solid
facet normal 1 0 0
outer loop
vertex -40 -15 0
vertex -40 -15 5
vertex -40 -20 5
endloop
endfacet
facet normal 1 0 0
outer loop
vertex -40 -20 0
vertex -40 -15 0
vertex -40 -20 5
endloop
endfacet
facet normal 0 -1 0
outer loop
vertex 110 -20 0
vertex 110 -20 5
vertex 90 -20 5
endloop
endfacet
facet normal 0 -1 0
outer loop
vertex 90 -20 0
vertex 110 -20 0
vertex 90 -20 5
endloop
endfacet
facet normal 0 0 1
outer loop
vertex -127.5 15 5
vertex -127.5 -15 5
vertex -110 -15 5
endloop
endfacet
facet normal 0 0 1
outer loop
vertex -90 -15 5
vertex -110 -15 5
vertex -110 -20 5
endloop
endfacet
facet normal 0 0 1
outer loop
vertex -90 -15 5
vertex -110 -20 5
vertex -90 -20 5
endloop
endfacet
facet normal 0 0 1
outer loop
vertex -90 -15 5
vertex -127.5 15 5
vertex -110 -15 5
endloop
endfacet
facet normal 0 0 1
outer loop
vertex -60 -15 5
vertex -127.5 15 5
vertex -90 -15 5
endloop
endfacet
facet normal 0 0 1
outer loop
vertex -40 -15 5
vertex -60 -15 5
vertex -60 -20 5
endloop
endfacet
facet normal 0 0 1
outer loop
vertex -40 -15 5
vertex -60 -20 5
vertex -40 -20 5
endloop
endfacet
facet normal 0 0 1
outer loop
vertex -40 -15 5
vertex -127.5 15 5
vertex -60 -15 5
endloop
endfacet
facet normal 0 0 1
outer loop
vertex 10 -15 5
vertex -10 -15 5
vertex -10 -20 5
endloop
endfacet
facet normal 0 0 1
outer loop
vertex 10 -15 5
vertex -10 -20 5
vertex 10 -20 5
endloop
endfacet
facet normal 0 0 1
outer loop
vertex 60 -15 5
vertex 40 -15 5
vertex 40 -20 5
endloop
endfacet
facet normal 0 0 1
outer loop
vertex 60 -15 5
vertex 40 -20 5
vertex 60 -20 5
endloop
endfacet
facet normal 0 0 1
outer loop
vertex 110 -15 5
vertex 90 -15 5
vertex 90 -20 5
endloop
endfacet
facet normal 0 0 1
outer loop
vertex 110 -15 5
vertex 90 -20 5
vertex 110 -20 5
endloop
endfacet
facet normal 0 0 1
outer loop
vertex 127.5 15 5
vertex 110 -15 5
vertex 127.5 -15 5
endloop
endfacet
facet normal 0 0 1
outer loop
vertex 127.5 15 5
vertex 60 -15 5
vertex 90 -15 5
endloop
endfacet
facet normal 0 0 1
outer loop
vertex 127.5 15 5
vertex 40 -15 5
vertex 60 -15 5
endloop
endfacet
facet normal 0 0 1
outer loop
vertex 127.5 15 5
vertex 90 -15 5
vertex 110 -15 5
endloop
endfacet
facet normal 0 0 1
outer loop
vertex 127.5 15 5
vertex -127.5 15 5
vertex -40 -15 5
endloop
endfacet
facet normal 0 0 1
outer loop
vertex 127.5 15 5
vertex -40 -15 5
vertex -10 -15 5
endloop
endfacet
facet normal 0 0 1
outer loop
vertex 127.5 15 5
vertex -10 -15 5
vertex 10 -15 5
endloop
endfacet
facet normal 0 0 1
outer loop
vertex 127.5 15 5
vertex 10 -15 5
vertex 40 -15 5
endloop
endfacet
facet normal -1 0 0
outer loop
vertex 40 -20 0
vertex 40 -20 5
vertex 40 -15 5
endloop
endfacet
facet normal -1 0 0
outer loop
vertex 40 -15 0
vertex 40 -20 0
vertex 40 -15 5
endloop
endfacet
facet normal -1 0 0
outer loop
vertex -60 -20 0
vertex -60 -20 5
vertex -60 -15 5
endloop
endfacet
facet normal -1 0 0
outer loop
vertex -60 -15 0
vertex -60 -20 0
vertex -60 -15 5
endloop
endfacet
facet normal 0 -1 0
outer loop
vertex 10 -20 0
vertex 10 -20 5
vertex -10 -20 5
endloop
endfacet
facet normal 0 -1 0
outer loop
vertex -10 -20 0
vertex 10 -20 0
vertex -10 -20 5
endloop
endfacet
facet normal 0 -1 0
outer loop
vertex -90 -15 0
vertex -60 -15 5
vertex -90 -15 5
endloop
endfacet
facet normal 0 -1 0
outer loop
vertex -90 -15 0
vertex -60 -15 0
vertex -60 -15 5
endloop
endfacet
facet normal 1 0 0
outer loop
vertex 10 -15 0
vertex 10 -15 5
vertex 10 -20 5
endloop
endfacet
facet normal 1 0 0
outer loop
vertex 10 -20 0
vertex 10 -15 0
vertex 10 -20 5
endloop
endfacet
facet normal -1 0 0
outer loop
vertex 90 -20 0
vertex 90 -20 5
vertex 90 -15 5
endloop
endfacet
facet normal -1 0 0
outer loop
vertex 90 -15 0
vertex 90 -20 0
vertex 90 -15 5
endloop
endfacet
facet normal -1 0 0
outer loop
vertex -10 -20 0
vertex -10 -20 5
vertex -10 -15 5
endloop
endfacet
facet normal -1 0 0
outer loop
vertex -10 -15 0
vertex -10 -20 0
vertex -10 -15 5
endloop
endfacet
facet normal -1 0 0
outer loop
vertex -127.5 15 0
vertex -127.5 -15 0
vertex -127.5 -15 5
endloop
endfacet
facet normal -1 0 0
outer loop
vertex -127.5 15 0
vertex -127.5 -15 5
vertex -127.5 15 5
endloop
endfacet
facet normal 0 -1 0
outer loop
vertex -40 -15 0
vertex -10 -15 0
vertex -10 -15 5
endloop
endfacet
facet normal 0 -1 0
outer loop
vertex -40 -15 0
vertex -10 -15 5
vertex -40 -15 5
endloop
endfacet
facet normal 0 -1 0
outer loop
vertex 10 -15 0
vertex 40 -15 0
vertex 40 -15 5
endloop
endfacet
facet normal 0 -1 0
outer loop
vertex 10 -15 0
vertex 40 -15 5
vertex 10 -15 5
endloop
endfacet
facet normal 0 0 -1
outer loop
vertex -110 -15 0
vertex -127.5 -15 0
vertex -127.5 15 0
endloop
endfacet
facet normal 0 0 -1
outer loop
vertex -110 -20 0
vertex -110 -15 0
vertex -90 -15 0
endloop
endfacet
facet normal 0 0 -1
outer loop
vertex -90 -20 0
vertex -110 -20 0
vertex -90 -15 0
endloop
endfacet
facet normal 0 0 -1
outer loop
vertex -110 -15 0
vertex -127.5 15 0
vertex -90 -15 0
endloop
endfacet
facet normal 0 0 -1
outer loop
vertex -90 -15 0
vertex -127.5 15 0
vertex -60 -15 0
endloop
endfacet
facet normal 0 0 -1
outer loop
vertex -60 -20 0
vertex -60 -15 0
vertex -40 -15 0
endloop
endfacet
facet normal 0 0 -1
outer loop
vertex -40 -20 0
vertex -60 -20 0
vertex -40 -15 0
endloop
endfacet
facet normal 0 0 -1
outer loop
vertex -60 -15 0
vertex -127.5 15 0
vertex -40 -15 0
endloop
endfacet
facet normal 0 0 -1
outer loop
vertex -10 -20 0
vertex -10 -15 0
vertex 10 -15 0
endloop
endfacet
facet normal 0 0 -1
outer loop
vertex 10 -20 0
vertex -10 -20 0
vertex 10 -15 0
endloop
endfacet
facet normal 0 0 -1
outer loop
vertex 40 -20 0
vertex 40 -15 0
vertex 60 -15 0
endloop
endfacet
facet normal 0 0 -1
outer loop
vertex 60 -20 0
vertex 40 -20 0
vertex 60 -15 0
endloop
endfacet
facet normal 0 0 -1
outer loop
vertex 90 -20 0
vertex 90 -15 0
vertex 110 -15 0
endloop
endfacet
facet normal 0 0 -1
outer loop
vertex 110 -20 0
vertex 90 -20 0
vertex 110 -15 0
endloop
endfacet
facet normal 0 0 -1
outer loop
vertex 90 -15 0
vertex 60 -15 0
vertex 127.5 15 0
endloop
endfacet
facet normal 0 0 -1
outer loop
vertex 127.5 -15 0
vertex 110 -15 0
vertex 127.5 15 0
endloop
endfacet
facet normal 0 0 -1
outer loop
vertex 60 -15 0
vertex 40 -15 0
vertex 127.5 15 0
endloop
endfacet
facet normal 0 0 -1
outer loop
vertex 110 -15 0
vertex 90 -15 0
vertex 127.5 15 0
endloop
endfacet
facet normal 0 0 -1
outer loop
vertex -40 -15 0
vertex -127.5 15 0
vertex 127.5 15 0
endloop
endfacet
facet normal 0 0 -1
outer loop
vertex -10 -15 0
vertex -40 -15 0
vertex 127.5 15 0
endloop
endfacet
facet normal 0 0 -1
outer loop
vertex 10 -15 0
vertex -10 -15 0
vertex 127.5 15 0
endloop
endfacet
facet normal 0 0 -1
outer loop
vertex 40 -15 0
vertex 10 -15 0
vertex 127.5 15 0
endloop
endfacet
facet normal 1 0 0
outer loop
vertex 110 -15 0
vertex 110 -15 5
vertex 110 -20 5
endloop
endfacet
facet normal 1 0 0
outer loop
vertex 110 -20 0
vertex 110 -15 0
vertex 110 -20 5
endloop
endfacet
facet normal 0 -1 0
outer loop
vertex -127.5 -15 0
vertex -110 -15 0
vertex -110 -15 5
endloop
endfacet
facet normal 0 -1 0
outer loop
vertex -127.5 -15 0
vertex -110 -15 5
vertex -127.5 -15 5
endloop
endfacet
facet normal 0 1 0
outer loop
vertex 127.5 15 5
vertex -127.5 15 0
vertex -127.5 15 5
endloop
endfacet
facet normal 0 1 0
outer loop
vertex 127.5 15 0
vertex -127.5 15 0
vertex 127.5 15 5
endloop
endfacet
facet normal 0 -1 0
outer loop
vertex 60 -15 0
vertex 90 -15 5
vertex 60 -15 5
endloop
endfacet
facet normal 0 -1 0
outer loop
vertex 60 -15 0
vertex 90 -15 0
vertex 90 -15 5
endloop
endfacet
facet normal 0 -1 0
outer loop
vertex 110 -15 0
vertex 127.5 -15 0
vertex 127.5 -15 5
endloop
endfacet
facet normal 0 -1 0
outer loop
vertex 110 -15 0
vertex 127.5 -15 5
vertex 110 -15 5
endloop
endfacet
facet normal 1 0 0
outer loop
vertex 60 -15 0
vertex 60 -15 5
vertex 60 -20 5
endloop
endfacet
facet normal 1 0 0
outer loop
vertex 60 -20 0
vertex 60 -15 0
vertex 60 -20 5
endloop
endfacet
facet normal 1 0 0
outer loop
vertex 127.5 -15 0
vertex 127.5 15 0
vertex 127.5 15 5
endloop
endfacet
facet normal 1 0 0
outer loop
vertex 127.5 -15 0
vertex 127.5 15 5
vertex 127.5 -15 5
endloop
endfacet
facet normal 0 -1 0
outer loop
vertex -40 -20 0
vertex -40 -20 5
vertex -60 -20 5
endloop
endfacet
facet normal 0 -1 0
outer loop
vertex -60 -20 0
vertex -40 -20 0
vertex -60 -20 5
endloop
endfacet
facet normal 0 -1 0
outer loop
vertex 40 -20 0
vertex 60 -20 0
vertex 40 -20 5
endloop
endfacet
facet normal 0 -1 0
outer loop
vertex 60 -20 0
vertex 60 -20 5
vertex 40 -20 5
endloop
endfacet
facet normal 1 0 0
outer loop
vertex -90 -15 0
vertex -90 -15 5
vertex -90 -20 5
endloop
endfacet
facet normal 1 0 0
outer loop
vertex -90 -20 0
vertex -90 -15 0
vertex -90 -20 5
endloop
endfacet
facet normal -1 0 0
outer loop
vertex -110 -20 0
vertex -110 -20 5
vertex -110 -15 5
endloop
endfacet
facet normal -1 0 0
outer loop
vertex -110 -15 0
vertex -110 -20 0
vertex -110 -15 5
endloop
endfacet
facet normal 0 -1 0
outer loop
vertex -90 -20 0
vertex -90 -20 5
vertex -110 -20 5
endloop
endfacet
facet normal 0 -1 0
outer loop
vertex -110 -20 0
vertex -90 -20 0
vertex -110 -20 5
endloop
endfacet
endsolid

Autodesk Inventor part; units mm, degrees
ref_plane "YZ Plane" through (0, 0, 0) normal (1, 0, 0) x (0, 1, 0)
ref_plane "XZ Plane" through (0, 0, 0) normal (0, 1, 0) x (-1, 0, 0)
ref_plane "XY Plane" through (0, 0, 0) normal (0, 0, 1) x (1, 0, 0)
sketch "Sketch1" plane through (0, 0, 0) normal (0, 0, 1) x (1, 0, 0)
  line L0 (-127.5, 15) -> (127.5, 15)
  line L1 (127.5, 15) -> (127.5, -15)
  line L2 (127.5, -15) -> (-127.5, -15)
  line L3 (-127.5, -15) -> (-127.5, 15)
  line L4 (-127.5, 15) -> (127.5, -15) construction
  line L5 (127.5, 15) -> (-127.5, -15) construction
  point P0 (0, 0)
  dimension "d0" = 255
  dimension "d1" = 30
extrude "Extrusion1" add sketch "Sketch1" along normal blind 5
sketch "Sketch2" plane through (0, 0, 5) normal (0, 0, 1) x (1, 0, 0)
  line L0 (-127.5, -15) -> (127.5, -15) projected
  line L1 (-110, -15) -> (-90, -15)
  line L2 (-90, -15) -> (-90, -20)
  line L3 (-90, -20) -> (-110, -20)
  line L4 (-110, -20) -> (-110, -15)
  line L5 (-60, -15) -> (-40, -15)
  line L6 (-40, -15) -> (-40, -20)
  line L7 (-40, -20) -> (-60, -20)
  line L8 (-60, -20) -> (-60, -15)
  line L9 (-10, -15) -> (10, -15)
  line L10 (10, -15) -> (10, -20)
  line L11 (10, -20) -> (-10, -20)
  line L12 (-10, -20) -> (-10, -15)
  line L13 (40, -15) -> (60, -15)
  line L14 (60, -15) -> (60, -20)
  line L15 (60, -20) -> (40, -20)
  line L16 (40, -20) -> (40, -15)
  line L17 (90, -15) -> (110, -15)
  line L18 (110, -15) -> (110, -20)
  line L19 (110, -20) -> (90, -20)
  line L20 (90, -20) -> (90, -15)
  point P0 (0, 0)
  point P1 (60, -15)
  point P2 (40, -15)
  point P3 (-90, -15)
  point P4 (-40, -15)
  point P5 (-60, -15)
  point P6 (10, -15)
  point P7 (-10, -15)
  point P8 (110, -15)
  point P9 (90, -15)
  dimension "d4" = 20
  dimension "d5" = 5
  dimension "d6" = 17.5
  dimension "d9" = 50
  dimension "d14" = 17.5
extrude "Extrusion2" add sketch "Sketch2" against normal blind 5
properties part number "Divisória-25cm"
